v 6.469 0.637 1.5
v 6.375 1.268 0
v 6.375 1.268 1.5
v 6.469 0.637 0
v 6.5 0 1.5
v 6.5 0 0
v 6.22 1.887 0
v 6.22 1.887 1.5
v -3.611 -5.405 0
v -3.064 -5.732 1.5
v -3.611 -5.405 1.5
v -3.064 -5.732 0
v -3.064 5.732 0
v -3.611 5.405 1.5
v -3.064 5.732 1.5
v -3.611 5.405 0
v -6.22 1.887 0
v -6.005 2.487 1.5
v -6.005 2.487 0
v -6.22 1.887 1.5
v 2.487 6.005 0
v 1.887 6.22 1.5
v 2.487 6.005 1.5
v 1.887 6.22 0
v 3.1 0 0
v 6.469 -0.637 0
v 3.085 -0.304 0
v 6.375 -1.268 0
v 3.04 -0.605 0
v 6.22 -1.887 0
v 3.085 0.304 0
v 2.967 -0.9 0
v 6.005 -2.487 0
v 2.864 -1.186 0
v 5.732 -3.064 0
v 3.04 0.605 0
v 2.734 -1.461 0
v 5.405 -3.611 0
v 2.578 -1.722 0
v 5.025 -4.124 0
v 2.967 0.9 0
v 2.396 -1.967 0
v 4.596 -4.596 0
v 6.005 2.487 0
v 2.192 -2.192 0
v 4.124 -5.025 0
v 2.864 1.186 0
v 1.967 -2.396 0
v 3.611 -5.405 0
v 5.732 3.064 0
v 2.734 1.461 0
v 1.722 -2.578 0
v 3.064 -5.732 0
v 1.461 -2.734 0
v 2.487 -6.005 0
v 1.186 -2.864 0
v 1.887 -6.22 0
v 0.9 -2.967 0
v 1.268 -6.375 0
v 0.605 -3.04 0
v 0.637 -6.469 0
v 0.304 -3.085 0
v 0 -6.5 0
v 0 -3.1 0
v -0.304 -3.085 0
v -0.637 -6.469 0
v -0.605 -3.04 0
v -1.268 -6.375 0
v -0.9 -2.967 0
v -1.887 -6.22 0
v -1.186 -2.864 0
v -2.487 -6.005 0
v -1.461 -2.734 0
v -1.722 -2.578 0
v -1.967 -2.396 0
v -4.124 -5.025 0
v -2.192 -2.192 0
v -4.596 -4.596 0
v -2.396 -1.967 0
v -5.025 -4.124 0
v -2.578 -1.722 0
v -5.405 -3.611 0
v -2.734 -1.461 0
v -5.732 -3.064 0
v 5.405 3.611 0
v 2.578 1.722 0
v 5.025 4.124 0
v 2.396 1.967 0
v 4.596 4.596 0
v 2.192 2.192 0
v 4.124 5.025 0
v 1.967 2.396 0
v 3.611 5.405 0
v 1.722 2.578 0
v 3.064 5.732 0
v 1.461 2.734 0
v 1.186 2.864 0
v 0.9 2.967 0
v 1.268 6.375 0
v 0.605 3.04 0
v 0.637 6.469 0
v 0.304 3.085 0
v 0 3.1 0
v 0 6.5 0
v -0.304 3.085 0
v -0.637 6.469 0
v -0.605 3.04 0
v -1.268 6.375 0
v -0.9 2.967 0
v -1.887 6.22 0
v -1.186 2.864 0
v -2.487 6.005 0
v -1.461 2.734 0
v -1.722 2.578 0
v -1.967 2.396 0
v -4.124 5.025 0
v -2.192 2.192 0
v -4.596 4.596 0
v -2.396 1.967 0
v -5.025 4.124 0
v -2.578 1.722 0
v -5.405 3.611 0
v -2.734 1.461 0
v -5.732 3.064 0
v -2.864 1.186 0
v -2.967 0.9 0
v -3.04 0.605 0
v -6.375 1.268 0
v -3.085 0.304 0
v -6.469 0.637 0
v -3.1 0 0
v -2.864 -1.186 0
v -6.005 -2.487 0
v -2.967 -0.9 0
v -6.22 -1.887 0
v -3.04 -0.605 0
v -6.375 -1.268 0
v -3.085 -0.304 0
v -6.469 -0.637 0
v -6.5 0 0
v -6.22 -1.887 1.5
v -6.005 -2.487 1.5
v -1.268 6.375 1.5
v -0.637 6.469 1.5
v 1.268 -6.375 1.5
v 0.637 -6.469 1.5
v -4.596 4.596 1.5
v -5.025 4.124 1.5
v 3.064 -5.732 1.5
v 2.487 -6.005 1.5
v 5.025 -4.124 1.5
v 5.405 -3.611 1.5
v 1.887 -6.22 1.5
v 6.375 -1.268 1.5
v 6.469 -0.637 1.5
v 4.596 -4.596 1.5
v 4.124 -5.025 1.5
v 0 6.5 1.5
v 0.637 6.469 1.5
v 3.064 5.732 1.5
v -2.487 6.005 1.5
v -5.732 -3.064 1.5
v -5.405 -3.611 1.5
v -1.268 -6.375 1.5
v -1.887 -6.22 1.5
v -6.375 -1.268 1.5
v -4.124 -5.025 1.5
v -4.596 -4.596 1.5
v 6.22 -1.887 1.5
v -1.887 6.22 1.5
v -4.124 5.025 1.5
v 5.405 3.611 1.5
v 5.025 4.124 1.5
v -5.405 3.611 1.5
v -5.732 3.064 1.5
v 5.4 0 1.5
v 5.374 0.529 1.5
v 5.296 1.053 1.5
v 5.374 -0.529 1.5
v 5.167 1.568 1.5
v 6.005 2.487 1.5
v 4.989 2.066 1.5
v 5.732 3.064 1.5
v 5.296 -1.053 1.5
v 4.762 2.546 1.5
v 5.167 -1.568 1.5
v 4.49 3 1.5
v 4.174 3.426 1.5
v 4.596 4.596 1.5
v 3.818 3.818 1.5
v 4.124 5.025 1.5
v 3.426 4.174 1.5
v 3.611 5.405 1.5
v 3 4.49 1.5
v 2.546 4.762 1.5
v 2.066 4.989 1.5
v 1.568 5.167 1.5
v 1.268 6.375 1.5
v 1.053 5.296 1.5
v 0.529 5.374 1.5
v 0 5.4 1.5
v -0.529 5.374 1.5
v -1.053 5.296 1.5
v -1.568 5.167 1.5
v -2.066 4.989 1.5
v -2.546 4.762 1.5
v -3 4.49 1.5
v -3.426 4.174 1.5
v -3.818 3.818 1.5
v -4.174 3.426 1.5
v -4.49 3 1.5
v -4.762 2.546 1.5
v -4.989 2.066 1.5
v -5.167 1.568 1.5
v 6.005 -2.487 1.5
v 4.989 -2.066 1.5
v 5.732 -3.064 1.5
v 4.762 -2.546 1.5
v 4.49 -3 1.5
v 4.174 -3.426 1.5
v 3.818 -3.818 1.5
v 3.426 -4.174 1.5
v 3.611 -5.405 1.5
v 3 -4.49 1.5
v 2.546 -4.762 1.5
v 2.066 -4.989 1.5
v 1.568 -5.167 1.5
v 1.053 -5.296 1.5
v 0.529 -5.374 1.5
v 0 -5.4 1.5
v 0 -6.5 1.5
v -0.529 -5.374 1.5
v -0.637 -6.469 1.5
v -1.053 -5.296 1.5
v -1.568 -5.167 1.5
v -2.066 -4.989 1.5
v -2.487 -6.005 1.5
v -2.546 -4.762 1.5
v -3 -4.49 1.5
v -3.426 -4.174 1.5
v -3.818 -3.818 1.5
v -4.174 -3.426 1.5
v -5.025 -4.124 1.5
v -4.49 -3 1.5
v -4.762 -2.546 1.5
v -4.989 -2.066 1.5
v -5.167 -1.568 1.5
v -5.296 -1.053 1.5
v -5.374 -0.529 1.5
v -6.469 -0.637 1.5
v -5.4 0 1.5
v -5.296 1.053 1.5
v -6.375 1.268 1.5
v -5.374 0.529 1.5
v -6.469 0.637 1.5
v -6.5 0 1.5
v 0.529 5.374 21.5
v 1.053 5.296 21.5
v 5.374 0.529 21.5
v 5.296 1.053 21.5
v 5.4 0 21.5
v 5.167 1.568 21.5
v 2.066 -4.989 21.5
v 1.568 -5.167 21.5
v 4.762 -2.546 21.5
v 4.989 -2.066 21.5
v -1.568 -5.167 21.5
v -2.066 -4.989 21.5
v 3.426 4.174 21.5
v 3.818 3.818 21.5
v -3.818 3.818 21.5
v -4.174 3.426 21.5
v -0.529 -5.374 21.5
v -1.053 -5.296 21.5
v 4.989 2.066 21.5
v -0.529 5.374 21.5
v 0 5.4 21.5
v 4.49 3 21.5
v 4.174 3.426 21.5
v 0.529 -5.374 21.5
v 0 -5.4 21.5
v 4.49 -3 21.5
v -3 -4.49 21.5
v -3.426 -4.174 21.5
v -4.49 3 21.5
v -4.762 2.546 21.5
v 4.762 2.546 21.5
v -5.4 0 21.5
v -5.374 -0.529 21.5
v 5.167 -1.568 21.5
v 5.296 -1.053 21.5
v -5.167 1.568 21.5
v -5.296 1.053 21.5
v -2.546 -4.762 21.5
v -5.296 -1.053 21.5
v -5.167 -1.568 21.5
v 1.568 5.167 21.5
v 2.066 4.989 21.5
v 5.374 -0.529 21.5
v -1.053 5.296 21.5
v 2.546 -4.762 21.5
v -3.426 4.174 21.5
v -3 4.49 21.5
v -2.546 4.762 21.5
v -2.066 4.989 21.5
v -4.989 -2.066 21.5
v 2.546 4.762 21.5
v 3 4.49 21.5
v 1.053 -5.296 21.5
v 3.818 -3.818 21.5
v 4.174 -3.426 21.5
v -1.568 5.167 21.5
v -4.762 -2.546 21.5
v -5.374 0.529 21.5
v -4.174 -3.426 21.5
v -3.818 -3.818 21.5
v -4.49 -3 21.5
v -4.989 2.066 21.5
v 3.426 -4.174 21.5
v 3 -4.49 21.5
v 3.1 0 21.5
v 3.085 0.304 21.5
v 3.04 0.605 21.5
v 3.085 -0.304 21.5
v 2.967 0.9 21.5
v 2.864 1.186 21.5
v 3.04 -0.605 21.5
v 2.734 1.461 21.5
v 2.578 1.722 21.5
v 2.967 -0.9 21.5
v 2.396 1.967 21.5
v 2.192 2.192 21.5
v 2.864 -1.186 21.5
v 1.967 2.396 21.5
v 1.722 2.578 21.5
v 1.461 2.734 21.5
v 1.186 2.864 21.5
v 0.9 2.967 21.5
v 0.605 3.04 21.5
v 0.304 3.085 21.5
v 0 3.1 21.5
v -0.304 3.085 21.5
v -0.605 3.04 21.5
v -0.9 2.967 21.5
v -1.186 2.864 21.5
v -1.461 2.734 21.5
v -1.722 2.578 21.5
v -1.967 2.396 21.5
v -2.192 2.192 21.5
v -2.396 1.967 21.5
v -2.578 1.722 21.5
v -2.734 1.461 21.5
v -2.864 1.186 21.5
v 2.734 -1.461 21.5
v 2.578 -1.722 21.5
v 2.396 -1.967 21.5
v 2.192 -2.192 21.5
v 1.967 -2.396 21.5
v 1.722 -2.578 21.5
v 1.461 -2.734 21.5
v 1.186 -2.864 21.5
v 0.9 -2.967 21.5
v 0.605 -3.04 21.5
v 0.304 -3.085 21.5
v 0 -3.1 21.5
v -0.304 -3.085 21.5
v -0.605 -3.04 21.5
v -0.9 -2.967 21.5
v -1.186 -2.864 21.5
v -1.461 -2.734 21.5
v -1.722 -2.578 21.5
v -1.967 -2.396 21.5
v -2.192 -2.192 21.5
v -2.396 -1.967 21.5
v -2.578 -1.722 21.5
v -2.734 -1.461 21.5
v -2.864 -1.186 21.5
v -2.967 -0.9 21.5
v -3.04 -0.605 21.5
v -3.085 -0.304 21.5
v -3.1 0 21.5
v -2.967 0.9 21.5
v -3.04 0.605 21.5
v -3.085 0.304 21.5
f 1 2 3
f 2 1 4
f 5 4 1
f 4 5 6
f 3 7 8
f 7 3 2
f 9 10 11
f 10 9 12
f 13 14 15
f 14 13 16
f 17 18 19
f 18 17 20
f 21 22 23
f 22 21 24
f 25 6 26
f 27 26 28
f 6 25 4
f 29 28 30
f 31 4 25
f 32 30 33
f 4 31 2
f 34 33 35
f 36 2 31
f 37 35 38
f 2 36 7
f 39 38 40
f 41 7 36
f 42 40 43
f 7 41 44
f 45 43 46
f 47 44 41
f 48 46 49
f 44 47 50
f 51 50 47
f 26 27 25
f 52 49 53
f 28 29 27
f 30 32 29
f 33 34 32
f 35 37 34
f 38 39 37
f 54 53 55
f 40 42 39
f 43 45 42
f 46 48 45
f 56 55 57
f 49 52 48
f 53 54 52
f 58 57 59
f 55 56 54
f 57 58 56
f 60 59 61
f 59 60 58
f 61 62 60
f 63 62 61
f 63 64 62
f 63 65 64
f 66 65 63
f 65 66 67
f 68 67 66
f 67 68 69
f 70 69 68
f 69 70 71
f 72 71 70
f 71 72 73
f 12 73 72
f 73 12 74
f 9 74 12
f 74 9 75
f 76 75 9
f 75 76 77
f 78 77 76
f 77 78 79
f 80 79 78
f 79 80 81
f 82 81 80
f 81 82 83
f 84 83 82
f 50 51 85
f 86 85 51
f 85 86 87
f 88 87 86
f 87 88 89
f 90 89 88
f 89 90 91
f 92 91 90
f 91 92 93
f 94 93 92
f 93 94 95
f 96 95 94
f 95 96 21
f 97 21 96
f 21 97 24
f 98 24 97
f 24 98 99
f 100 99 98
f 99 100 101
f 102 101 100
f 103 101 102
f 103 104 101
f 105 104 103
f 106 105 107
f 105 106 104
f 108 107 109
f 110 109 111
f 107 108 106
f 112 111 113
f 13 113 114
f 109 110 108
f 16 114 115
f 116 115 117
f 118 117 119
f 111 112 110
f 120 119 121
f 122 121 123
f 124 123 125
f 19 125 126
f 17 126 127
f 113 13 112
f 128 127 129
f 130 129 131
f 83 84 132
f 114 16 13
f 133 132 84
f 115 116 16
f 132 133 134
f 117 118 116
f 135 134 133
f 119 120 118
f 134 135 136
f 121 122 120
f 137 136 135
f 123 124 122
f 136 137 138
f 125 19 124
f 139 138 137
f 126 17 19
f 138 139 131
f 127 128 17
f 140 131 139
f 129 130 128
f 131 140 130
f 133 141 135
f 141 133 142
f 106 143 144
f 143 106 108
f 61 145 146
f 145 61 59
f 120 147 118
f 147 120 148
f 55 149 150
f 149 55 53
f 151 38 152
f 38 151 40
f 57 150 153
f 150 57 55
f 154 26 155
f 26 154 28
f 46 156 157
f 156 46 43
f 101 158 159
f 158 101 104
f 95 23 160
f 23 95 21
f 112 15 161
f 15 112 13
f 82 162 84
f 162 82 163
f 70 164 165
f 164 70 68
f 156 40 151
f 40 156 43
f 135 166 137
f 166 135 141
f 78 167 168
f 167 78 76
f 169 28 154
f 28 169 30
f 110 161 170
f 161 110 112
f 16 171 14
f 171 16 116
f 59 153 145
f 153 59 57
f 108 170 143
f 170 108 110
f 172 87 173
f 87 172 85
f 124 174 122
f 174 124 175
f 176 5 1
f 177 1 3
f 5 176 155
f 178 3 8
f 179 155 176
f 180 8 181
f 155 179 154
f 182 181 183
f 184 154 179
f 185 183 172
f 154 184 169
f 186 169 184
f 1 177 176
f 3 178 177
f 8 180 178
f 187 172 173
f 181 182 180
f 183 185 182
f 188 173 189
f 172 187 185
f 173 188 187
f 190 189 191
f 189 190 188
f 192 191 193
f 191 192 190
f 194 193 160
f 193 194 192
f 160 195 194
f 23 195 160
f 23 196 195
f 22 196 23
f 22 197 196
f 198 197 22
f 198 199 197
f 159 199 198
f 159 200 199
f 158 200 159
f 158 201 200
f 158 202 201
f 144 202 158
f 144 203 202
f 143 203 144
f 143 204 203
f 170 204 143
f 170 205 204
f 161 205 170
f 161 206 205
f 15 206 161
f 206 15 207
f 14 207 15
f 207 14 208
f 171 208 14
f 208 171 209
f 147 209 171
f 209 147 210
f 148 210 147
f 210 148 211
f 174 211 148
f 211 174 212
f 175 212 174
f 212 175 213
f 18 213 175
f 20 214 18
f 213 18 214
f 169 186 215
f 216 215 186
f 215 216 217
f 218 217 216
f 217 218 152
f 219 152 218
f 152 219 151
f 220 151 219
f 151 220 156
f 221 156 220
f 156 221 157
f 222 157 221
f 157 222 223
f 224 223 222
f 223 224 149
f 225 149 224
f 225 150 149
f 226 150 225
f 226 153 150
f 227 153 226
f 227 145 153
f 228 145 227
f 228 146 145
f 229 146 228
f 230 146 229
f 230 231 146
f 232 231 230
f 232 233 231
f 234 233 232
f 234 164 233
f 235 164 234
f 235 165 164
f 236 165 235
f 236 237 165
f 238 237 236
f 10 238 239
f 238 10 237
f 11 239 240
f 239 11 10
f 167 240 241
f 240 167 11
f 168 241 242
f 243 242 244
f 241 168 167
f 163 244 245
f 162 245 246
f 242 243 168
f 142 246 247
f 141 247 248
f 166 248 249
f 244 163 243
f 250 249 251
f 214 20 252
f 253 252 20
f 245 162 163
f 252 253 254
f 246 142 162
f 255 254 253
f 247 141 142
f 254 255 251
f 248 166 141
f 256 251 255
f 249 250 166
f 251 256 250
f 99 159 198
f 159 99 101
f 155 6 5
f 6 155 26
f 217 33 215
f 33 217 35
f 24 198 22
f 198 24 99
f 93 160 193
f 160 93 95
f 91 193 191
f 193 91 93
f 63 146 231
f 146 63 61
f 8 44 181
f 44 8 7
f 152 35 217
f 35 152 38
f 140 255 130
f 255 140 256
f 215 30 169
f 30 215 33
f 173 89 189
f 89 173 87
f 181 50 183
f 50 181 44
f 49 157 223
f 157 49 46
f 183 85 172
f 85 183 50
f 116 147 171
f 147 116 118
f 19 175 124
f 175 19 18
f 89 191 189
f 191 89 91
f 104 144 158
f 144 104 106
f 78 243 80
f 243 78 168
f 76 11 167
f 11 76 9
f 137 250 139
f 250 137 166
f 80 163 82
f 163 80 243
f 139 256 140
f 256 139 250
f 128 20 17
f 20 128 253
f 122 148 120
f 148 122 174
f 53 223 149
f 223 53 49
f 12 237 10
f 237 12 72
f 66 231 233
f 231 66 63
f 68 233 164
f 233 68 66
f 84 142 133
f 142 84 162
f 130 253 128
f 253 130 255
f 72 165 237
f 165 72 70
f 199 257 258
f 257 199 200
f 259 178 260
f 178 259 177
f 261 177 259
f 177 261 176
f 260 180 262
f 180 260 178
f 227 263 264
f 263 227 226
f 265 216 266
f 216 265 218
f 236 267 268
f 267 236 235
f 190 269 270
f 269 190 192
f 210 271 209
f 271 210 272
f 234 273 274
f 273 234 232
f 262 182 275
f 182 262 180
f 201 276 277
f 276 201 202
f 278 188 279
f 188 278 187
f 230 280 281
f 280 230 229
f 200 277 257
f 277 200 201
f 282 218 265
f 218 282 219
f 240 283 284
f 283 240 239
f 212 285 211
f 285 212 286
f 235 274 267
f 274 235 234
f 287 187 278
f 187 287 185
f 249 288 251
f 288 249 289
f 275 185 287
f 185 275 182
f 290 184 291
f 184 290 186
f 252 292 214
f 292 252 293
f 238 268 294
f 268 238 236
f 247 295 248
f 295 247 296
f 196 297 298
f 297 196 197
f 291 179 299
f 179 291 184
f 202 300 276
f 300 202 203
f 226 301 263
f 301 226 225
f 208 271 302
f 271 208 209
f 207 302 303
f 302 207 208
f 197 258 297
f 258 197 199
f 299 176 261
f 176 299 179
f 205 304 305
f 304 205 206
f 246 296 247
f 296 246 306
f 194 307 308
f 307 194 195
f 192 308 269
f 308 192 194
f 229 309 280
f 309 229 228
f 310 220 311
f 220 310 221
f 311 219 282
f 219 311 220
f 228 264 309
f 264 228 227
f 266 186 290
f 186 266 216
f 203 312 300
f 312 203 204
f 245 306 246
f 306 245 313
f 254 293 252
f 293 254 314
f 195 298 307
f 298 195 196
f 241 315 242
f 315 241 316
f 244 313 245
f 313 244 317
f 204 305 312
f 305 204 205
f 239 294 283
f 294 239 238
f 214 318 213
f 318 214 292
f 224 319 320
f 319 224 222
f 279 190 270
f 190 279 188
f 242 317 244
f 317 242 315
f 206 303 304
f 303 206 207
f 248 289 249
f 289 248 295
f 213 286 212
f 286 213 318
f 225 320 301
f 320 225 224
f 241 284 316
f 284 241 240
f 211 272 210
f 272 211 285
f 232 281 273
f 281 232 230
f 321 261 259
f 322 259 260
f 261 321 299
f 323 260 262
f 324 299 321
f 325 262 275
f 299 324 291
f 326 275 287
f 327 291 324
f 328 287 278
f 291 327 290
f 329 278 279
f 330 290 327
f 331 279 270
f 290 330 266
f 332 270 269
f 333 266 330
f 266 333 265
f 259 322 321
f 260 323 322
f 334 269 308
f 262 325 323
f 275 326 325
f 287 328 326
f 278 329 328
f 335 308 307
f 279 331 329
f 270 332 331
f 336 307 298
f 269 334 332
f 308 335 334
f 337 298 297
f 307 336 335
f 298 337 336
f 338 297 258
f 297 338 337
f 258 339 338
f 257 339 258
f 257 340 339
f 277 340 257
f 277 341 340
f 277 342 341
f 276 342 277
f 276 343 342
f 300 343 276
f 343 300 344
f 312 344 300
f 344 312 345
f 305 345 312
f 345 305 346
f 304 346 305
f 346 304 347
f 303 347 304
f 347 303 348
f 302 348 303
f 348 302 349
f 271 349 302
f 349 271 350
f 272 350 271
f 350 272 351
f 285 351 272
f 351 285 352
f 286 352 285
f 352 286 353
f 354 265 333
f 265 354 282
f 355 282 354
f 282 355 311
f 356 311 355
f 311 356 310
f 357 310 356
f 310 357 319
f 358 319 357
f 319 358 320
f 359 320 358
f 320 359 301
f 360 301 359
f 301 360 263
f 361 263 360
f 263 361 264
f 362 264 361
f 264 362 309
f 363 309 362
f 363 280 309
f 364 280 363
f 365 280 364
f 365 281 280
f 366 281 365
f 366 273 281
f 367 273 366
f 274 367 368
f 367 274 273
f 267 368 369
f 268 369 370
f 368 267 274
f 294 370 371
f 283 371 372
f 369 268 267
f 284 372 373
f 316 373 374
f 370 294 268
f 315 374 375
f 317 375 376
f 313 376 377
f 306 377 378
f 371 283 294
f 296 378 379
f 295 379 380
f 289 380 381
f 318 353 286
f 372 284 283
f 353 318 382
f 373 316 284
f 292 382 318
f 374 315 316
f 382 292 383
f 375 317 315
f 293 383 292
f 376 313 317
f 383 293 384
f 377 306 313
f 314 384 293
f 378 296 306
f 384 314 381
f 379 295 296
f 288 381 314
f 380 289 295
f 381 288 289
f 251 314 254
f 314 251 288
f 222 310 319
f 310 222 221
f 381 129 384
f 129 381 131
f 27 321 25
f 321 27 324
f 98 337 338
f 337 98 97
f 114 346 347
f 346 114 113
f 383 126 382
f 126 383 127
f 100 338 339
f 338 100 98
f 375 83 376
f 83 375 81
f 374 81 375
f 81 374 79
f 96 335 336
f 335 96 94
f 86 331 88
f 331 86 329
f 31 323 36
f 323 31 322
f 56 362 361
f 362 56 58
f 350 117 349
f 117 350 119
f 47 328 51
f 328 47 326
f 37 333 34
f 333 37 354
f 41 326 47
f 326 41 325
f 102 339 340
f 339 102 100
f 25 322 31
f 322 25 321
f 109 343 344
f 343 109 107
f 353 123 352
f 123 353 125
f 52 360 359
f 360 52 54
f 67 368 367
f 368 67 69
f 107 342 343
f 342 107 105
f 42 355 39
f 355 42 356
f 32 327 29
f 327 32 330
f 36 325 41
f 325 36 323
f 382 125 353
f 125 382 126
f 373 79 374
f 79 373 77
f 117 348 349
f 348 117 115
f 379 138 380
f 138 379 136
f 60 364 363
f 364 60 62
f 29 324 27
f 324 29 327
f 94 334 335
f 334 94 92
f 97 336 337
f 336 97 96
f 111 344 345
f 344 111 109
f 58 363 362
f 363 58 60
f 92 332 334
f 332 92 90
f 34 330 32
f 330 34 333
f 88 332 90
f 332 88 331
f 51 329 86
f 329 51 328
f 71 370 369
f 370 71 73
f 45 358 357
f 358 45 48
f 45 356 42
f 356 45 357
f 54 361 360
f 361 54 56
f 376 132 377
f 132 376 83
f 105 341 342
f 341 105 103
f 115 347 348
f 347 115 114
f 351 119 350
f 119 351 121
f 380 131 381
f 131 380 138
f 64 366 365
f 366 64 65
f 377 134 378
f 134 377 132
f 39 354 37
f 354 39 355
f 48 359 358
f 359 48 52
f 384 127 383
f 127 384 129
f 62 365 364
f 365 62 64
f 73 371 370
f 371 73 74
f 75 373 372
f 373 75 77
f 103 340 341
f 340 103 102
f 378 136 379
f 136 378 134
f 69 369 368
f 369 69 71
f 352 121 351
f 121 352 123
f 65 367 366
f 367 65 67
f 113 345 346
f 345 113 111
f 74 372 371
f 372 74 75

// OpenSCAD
// Built by bench/smallmodels/features/compiler.py from a list of features.
$fn = 64;
difference() {
  union() {
    translate([0, 0, 0]) cylinder(d = 13, h = 1.5);
    translate([0, 0, 1.5]) cylinder(d = 10.8, h = 20);
  }
  union() {
    translate([0, 0, -1]) rotate([0, 0, 0]) cylinder(d = 6.2, h = 23.5);
  }
}
